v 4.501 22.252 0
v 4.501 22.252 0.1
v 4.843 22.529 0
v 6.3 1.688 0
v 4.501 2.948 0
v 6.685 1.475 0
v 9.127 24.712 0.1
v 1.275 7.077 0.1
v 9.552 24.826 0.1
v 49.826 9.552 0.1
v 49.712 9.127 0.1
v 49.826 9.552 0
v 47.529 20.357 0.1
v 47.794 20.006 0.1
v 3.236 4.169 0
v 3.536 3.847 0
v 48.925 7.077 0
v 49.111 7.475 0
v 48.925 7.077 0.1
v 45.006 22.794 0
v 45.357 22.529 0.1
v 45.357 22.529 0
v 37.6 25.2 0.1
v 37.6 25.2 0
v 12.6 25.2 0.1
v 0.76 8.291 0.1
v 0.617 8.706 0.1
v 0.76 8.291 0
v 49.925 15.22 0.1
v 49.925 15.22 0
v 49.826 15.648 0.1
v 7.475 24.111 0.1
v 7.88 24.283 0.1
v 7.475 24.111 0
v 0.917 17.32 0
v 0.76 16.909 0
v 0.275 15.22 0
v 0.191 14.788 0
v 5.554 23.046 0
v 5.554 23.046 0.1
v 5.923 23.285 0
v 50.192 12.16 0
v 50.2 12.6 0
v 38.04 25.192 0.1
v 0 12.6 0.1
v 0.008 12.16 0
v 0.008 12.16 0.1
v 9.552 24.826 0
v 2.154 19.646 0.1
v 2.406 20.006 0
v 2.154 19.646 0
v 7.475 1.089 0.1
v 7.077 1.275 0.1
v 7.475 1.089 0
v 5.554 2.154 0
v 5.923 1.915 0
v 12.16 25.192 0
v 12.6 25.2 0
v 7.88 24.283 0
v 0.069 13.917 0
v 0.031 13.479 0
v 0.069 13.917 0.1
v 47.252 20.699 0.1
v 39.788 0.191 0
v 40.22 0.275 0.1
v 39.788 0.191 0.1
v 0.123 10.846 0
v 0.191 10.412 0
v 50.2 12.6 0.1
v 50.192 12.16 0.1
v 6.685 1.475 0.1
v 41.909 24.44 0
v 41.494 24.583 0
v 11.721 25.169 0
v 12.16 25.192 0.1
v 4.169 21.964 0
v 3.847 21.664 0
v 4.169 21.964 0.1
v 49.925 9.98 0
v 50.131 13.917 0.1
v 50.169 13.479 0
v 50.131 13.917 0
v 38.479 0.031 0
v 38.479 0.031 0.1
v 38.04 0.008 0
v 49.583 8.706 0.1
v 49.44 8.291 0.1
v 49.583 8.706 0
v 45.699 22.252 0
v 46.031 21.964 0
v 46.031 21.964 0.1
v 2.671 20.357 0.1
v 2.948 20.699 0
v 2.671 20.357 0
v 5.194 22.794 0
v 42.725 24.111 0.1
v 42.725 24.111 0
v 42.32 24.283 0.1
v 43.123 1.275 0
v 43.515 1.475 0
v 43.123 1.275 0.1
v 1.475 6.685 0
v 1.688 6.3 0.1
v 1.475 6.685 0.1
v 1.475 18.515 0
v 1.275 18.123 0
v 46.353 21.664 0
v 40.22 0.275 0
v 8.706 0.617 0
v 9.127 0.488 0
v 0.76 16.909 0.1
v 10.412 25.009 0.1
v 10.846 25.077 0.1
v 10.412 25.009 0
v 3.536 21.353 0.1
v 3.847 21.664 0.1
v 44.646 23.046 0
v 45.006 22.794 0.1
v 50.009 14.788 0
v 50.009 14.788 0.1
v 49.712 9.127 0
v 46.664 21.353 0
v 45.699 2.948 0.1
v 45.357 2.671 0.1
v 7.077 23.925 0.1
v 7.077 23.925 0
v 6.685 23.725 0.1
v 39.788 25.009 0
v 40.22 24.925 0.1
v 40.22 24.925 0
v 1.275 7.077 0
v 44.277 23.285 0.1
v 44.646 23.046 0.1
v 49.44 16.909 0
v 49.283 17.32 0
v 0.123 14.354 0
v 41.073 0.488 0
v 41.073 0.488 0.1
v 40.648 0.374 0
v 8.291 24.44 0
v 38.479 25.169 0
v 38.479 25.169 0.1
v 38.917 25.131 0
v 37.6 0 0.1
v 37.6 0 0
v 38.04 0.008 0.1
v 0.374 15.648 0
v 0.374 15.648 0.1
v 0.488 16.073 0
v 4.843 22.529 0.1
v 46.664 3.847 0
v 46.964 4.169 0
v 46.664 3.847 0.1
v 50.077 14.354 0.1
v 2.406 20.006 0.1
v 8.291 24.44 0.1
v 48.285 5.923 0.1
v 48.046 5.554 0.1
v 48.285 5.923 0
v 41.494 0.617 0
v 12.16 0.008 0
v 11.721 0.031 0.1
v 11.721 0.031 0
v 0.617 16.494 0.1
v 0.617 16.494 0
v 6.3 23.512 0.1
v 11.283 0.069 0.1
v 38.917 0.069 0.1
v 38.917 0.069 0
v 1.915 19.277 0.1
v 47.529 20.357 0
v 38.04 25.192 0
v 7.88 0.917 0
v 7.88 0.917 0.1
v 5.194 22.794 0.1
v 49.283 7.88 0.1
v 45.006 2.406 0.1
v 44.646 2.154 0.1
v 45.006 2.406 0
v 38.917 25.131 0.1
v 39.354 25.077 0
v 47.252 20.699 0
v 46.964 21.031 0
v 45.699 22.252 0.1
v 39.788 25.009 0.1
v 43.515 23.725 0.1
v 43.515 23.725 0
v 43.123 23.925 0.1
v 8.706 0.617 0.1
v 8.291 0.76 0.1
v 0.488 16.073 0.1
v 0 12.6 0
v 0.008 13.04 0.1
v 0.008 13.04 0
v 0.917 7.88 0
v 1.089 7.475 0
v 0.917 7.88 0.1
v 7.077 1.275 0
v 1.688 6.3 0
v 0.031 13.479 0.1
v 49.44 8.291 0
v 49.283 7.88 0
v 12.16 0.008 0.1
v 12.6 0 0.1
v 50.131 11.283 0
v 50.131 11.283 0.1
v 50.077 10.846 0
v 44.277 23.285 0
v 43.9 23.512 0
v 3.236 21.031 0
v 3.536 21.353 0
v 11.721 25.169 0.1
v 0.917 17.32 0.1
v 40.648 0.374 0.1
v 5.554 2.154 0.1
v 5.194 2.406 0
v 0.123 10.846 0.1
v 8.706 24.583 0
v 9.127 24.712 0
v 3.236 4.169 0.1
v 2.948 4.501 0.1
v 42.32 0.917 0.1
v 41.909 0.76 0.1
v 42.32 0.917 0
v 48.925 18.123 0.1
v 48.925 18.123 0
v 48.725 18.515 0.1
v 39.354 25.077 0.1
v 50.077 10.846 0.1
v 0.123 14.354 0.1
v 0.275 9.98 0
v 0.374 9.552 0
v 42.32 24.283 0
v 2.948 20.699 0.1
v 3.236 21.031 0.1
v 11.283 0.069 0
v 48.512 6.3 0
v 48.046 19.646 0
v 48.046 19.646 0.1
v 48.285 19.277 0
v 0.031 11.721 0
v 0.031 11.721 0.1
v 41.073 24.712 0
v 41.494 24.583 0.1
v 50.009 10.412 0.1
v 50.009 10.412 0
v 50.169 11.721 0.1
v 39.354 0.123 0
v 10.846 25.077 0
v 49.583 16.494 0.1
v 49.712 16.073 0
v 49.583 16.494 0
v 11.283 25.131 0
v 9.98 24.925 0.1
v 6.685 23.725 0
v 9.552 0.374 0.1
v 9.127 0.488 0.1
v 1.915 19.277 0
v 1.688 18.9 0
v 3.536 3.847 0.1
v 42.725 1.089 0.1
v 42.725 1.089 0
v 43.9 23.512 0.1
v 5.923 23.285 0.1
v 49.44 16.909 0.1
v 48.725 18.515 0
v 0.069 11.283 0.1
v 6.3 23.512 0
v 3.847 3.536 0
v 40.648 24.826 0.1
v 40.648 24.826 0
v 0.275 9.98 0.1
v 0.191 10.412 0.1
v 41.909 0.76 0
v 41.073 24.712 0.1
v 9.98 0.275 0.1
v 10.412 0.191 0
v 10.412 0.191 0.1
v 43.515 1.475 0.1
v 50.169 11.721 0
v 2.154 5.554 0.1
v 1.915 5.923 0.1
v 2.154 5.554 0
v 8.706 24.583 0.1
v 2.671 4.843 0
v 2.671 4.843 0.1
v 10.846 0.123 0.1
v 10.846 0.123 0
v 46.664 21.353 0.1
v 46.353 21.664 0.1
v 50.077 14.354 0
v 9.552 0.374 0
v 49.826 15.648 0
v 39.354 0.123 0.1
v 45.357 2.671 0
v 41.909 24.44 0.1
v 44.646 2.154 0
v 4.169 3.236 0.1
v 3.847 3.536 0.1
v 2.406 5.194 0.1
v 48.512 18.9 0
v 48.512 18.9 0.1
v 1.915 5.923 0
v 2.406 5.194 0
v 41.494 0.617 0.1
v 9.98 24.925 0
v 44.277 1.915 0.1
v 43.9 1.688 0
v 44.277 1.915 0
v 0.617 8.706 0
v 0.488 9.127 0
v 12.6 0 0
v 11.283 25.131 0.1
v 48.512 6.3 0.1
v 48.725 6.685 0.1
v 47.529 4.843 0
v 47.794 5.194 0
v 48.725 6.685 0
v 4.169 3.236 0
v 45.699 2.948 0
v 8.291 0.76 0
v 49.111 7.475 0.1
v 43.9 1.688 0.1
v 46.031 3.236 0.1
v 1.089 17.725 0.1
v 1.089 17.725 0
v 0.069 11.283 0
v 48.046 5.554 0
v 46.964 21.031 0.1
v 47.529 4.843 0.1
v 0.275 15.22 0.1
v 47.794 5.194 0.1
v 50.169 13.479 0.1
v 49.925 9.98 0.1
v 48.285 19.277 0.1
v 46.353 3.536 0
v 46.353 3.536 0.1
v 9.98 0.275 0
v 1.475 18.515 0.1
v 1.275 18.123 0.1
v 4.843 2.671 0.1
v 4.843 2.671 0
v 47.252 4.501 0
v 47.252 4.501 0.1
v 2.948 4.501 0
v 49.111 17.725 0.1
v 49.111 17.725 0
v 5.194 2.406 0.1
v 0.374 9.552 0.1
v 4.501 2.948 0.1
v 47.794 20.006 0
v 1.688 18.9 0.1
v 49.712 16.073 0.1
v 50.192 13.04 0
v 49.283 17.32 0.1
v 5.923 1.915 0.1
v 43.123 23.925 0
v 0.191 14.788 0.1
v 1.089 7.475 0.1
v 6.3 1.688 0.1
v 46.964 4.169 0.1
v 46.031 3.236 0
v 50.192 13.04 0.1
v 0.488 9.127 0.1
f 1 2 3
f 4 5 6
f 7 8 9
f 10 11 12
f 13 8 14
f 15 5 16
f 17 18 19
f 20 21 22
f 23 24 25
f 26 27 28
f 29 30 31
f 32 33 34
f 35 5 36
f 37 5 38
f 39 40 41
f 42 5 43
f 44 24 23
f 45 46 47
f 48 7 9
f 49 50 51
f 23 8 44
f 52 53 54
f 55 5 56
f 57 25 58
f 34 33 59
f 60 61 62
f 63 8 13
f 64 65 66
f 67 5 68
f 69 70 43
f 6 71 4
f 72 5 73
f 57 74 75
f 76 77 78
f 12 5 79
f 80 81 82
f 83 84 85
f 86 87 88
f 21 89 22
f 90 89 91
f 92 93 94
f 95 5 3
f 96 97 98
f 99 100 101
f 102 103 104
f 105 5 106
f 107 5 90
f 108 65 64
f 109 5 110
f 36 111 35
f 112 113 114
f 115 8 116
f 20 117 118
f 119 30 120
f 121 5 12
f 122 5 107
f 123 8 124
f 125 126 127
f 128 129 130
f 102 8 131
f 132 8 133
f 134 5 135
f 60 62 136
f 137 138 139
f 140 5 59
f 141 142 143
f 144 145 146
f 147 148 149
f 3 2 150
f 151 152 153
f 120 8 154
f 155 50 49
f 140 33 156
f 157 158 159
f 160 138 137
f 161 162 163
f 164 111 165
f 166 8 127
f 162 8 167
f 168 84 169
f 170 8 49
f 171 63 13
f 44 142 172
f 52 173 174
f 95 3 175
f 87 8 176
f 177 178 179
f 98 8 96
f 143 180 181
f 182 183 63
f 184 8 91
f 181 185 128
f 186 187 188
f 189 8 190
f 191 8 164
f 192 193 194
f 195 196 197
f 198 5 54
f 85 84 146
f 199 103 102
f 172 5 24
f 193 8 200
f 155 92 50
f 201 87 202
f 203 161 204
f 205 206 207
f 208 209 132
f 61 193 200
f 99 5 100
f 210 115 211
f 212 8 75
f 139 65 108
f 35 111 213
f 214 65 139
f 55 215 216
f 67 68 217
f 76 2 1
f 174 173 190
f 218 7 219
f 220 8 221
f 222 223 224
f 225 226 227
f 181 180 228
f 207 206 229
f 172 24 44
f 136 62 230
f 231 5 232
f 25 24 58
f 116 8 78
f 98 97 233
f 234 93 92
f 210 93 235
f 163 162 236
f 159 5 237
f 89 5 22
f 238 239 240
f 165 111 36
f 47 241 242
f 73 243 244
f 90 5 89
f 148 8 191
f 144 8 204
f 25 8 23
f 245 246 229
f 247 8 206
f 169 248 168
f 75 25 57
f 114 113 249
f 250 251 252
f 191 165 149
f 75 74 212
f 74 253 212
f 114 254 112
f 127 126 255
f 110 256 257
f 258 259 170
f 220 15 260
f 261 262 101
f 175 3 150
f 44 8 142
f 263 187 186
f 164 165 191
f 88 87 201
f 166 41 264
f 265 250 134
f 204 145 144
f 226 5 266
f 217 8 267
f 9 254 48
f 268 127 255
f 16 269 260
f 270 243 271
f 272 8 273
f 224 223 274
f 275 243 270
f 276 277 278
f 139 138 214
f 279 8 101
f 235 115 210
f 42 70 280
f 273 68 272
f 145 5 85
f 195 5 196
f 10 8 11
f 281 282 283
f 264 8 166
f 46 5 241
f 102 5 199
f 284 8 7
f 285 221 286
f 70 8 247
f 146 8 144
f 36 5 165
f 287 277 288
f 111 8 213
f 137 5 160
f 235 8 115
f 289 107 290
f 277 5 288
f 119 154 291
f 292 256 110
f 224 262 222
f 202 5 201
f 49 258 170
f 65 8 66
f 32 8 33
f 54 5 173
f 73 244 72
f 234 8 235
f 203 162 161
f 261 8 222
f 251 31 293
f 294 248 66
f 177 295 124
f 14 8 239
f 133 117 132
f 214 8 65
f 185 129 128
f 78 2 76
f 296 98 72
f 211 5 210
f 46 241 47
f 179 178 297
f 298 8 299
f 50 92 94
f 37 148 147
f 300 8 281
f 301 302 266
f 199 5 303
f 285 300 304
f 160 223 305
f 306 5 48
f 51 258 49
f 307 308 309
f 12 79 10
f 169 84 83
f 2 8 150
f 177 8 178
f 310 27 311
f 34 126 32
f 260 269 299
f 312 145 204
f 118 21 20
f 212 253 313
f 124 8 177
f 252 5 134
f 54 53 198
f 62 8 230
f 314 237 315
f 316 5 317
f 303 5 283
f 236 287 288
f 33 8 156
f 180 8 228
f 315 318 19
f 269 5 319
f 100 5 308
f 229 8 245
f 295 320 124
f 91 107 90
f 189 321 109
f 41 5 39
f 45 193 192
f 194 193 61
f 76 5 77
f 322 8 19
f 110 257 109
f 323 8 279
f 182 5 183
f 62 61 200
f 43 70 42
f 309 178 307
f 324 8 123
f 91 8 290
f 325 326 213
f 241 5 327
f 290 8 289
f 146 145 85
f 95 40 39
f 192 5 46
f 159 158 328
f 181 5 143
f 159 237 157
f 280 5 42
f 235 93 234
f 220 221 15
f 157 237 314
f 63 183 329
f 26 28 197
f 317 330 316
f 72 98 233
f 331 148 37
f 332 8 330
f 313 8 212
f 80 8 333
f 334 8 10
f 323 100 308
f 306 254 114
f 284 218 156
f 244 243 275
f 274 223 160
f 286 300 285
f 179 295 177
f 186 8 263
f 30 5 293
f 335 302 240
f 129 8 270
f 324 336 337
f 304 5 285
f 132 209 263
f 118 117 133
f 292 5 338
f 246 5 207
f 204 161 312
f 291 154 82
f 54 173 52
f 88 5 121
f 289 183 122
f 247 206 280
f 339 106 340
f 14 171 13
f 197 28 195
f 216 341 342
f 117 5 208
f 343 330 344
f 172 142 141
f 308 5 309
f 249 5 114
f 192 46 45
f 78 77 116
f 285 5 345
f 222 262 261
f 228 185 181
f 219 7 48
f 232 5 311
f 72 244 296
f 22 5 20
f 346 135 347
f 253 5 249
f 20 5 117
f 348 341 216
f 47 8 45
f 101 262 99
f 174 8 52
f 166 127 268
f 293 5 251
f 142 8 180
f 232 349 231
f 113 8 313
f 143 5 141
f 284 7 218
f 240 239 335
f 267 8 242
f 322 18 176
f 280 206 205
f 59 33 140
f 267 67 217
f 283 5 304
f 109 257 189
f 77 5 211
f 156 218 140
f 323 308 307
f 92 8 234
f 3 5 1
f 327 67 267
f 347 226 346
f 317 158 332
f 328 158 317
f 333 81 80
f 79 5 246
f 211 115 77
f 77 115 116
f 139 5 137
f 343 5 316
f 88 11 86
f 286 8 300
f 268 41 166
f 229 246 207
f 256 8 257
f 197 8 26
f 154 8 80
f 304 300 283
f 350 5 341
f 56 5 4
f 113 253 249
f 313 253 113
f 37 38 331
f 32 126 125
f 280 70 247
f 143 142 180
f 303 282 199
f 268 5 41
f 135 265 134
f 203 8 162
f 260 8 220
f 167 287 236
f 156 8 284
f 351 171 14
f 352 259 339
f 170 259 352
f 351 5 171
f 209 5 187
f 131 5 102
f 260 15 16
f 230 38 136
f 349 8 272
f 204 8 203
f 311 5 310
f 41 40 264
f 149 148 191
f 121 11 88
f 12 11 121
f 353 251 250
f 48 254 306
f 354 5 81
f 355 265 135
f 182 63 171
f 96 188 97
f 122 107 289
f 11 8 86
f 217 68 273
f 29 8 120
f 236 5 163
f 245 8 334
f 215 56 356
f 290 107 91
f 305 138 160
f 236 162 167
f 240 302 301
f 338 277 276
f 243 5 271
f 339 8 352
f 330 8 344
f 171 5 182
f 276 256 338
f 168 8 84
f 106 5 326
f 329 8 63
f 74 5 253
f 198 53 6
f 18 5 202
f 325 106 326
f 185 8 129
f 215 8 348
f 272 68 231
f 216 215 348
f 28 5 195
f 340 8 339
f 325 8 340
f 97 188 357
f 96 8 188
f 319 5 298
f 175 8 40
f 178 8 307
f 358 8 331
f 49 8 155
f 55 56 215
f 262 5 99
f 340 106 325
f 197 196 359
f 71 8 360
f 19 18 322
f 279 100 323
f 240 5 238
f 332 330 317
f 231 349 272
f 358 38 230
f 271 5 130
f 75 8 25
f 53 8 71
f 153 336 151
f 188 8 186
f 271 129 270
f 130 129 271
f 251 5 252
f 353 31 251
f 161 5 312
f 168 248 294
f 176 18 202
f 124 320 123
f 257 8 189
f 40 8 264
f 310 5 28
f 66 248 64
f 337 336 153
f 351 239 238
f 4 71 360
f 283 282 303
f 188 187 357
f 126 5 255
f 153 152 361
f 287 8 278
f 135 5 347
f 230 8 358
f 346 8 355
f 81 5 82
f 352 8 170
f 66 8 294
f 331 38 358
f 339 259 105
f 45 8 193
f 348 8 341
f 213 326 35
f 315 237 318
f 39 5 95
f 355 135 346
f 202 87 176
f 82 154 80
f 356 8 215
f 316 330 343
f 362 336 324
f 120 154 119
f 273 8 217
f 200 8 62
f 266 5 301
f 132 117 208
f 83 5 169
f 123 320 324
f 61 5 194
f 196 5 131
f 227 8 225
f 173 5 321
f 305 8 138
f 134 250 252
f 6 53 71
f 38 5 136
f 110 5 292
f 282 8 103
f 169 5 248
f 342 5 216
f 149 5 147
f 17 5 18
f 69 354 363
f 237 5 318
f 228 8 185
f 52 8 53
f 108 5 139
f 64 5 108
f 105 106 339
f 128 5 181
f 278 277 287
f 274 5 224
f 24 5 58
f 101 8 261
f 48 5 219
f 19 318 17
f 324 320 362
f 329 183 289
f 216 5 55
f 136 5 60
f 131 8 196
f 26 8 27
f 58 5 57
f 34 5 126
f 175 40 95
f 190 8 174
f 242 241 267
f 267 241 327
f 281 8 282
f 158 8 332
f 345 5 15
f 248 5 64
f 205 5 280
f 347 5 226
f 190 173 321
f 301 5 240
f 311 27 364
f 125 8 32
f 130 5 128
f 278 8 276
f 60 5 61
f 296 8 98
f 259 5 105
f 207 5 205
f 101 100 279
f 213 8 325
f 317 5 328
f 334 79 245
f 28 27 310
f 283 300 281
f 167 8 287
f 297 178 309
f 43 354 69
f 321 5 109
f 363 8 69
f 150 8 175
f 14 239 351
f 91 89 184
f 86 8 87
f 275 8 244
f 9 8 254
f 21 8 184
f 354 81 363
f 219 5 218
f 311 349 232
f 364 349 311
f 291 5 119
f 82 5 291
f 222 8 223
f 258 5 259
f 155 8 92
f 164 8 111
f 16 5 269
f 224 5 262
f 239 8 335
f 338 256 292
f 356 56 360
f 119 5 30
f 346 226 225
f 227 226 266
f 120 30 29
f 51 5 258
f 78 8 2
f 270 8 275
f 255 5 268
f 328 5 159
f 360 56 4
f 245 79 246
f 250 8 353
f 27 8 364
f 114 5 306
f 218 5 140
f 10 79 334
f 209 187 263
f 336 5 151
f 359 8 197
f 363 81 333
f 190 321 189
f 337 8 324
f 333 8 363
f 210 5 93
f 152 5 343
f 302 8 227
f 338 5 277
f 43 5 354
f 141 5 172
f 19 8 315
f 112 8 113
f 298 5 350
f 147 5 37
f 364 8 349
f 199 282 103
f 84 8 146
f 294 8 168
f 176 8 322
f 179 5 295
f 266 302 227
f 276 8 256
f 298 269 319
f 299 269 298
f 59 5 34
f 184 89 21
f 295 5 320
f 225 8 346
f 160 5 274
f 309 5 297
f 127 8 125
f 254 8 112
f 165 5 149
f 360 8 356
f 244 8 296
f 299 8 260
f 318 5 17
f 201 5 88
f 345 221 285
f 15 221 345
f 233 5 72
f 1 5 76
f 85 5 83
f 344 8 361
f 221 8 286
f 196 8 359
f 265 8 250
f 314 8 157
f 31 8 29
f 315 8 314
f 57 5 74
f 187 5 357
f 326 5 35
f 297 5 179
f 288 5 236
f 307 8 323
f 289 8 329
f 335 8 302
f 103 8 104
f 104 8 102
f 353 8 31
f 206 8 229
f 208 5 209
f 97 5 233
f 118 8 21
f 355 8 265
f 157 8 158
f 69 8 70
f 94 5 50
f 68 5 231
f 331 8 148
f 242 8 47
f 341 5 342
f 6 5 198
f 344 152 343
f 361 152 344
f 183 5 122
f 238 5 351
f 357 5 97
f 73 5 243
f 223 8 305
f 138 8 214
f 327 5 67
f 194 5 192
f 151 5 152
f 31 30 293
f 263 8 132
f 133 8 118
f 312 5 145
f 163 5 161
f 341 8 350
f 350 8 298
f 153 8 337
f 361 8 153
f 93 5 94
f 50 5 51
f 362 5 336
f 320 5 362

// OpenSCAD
$fn = 180; R=12.6; H=0.1;
hull() {
   translate([R,R,0]) cylinder(h = H, r=R);
   translate([50.2-R,R,0]) cylinder(h = H, r=R);}
